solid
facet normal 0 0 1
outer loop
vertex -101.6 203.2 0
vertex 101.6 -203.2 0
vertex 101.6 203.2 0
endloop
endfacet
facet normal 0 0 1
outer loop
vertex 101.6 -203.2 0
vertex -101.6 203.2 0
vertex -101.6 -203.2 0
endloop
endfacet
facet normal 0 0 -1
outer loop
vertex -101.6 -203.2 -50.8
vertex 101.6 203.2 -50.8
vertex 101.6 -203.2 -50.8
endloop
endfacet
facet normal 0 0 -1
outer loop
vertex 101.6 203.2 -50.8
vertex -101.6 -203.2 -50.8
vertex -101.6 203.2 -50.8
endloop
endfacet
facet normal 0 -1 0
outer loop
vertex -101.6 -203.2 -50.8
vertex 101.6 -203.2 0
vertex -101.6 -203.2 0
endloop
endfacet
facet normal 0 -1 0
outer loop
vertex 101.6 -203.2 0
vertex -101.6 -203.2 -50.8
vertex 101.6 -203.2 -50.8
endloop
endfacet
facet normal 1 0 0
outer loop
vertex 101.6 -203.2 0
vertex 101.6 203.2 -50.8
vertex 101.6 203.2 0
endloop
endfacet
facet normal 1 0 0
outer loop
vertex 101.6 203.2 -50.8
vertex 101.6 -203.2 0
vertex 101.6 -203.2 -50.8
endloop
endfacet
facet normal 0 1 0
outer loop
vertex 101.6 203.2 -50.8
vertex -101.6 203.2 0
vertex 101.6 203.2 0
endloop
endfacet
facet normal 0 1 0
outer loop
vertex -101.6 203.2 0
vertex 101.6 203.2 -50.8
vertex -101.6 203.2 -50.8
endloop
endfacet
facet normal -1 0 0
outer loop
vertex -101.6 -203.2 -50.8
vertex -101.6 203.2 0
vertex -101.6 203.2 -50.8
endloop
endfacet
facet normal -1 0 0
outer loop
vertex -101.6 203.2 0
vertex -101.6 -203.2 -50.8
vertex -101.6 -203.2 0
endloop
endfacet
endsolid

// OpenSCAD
function foot(x=1) = 304.8*x;
function inch(x=1) = 25.4*x;
function nominal(inch) = 
  (inch==1) ? 19 : 
  (inch==2) ? 38 : 
  (inch==4) ? 90 : 
  (inch==6) ? 140 : 
  0;

function deckThick() = inch(0.94); 
metThick = 1;

module lumber6feet2x4()
{
  color("burlywood")cube([foot(6),38,90],center=true);
  echo("2x4 6 feet");
}

module lumber8feet2x4()
{
  color("tan")cube([foot(8),38,90],center=true);
  echo("2x4 8 feet");
}

module joistHanger2x4()
{
  color("steelblue")
  translate([0,-inch(3.13)/2,-nominal(4)/2+inch(1)])
  {
    translate([(nominal(2)/2),0,0])cube([metThick,inch(3.13),inch(2)],center=true);
    translate([-(nominal(2)/2),0,0])cube([metThick,inch(3.13),inch(2)],center=true);
    translate([0,0,-inch(1)])cube([nominal(2),inch(3.13),metThick],center=true);
    translate([(nominal(2)-metThick+(inch(3.56)-nominal(2))/2)/2,(inch(3.13)-metThick)/2,0])cube([(inch(3.56)-nominal(2))/2,metThick,inch(2)],center=true);
    translate([-(nominal(2)-metThick+(inch(3.56)-nominal(2))/2)/2,(inch(3.13)-metThick)/2,0])cube([(inch(3.56)-nominal(2))/2,metThick,inch(2)],center=true);
  }
  echo("joisthanger 2x4");
}

module framingAngle()
{
  height=inch(2.5);
  width=inch(1.4375);
  color("steelblue")
  {
    translate([0,width/2,0])cube([metThick,width,height],center=true);
    rotate([0,0,-90])translate([0,width/2,0])cube([metThick,width,height],center=true);
  }
  echo("Framing angle");
}

module deckBoard()
{
  color("LightGray")
  {
    cube([foot(8),inch(5.5),deckThick()],center=true);
  }
  echo("deckBoard");
}

module deckStripped()
{
  strippedWidth = 2*nominal(2);
  //Center the strip to match full deck boards for easier spacing
  centerPoint = (inch(5.5)-strippedWidth)/2;
  translate([0,centerPoint,0])
  color("LightGray")
  {
    cube([foot(8),strippedWidth,deckThick()],center=true);
  }
  echo("deckBoard");
}

module faciaFront()
{
  color("Gray")
  {
    cube([foot(8),deckThick(),inch(5.5)],center=true);
  }
  echo("faciaFront");
}

module faciaSide()
{
  color("DarkGray")
  rotate([0,0,90])
  {
    cube([foot(6)+2*nominal(2)+deckThick(),deckThick(),inch(5.5)],center=true);
  }
  echo("faciaSide");
}

module deckFastener()
{
  color("black") cube([inch(0.5),inch(0.5),deckThick()],center=true);
  echo("deck fasterner");
}

module camoBlock()
{
  side=inch(15.75);
  height=inch(5.5)-nominal(4);
  totalheight=inch(3.5);
  slot=inch(1.625);
  
  translate([0,0,-height/2])
  color("DarkSlateGray")
  {
    cube([side,side,height],center=true);
    translate([0,0,(totalheight-height)/2+height/2])difference()
    {
      cube([side, side, totalheight-height],center=true);
      cube([slot,1000,100],center=true);
      cube([1000,slot,100,],center=true);
    }
  }
  echo("Footing Camo block");
}

module adjustFoot()
{
  color("DarkSlateGray")
  {
    translate([0,0,-inch(1)])cylinder(d=inch(3+5/32),h=inch(2),center=true);
    translate([0,0,-inch(2)+5])cylinder(d=inch(6+3/8),h=10,center=true);
    translate([nominal(2)/2+2,0,inch(1+1/32)/2])cube([4,inch(1+31/32),inch(1+1/32)],center=true);
  }
  echo("Adjustable foot");
}

module concreteBlock()
{
  height=inch(2);
  
  translate([0,0,-height/2])
  color("DarkSlateGray")
  {
    cube([inch(8),inch(16),height],center=true);
  }
  echo("Footing concrete block");
}


concreteBlock();
